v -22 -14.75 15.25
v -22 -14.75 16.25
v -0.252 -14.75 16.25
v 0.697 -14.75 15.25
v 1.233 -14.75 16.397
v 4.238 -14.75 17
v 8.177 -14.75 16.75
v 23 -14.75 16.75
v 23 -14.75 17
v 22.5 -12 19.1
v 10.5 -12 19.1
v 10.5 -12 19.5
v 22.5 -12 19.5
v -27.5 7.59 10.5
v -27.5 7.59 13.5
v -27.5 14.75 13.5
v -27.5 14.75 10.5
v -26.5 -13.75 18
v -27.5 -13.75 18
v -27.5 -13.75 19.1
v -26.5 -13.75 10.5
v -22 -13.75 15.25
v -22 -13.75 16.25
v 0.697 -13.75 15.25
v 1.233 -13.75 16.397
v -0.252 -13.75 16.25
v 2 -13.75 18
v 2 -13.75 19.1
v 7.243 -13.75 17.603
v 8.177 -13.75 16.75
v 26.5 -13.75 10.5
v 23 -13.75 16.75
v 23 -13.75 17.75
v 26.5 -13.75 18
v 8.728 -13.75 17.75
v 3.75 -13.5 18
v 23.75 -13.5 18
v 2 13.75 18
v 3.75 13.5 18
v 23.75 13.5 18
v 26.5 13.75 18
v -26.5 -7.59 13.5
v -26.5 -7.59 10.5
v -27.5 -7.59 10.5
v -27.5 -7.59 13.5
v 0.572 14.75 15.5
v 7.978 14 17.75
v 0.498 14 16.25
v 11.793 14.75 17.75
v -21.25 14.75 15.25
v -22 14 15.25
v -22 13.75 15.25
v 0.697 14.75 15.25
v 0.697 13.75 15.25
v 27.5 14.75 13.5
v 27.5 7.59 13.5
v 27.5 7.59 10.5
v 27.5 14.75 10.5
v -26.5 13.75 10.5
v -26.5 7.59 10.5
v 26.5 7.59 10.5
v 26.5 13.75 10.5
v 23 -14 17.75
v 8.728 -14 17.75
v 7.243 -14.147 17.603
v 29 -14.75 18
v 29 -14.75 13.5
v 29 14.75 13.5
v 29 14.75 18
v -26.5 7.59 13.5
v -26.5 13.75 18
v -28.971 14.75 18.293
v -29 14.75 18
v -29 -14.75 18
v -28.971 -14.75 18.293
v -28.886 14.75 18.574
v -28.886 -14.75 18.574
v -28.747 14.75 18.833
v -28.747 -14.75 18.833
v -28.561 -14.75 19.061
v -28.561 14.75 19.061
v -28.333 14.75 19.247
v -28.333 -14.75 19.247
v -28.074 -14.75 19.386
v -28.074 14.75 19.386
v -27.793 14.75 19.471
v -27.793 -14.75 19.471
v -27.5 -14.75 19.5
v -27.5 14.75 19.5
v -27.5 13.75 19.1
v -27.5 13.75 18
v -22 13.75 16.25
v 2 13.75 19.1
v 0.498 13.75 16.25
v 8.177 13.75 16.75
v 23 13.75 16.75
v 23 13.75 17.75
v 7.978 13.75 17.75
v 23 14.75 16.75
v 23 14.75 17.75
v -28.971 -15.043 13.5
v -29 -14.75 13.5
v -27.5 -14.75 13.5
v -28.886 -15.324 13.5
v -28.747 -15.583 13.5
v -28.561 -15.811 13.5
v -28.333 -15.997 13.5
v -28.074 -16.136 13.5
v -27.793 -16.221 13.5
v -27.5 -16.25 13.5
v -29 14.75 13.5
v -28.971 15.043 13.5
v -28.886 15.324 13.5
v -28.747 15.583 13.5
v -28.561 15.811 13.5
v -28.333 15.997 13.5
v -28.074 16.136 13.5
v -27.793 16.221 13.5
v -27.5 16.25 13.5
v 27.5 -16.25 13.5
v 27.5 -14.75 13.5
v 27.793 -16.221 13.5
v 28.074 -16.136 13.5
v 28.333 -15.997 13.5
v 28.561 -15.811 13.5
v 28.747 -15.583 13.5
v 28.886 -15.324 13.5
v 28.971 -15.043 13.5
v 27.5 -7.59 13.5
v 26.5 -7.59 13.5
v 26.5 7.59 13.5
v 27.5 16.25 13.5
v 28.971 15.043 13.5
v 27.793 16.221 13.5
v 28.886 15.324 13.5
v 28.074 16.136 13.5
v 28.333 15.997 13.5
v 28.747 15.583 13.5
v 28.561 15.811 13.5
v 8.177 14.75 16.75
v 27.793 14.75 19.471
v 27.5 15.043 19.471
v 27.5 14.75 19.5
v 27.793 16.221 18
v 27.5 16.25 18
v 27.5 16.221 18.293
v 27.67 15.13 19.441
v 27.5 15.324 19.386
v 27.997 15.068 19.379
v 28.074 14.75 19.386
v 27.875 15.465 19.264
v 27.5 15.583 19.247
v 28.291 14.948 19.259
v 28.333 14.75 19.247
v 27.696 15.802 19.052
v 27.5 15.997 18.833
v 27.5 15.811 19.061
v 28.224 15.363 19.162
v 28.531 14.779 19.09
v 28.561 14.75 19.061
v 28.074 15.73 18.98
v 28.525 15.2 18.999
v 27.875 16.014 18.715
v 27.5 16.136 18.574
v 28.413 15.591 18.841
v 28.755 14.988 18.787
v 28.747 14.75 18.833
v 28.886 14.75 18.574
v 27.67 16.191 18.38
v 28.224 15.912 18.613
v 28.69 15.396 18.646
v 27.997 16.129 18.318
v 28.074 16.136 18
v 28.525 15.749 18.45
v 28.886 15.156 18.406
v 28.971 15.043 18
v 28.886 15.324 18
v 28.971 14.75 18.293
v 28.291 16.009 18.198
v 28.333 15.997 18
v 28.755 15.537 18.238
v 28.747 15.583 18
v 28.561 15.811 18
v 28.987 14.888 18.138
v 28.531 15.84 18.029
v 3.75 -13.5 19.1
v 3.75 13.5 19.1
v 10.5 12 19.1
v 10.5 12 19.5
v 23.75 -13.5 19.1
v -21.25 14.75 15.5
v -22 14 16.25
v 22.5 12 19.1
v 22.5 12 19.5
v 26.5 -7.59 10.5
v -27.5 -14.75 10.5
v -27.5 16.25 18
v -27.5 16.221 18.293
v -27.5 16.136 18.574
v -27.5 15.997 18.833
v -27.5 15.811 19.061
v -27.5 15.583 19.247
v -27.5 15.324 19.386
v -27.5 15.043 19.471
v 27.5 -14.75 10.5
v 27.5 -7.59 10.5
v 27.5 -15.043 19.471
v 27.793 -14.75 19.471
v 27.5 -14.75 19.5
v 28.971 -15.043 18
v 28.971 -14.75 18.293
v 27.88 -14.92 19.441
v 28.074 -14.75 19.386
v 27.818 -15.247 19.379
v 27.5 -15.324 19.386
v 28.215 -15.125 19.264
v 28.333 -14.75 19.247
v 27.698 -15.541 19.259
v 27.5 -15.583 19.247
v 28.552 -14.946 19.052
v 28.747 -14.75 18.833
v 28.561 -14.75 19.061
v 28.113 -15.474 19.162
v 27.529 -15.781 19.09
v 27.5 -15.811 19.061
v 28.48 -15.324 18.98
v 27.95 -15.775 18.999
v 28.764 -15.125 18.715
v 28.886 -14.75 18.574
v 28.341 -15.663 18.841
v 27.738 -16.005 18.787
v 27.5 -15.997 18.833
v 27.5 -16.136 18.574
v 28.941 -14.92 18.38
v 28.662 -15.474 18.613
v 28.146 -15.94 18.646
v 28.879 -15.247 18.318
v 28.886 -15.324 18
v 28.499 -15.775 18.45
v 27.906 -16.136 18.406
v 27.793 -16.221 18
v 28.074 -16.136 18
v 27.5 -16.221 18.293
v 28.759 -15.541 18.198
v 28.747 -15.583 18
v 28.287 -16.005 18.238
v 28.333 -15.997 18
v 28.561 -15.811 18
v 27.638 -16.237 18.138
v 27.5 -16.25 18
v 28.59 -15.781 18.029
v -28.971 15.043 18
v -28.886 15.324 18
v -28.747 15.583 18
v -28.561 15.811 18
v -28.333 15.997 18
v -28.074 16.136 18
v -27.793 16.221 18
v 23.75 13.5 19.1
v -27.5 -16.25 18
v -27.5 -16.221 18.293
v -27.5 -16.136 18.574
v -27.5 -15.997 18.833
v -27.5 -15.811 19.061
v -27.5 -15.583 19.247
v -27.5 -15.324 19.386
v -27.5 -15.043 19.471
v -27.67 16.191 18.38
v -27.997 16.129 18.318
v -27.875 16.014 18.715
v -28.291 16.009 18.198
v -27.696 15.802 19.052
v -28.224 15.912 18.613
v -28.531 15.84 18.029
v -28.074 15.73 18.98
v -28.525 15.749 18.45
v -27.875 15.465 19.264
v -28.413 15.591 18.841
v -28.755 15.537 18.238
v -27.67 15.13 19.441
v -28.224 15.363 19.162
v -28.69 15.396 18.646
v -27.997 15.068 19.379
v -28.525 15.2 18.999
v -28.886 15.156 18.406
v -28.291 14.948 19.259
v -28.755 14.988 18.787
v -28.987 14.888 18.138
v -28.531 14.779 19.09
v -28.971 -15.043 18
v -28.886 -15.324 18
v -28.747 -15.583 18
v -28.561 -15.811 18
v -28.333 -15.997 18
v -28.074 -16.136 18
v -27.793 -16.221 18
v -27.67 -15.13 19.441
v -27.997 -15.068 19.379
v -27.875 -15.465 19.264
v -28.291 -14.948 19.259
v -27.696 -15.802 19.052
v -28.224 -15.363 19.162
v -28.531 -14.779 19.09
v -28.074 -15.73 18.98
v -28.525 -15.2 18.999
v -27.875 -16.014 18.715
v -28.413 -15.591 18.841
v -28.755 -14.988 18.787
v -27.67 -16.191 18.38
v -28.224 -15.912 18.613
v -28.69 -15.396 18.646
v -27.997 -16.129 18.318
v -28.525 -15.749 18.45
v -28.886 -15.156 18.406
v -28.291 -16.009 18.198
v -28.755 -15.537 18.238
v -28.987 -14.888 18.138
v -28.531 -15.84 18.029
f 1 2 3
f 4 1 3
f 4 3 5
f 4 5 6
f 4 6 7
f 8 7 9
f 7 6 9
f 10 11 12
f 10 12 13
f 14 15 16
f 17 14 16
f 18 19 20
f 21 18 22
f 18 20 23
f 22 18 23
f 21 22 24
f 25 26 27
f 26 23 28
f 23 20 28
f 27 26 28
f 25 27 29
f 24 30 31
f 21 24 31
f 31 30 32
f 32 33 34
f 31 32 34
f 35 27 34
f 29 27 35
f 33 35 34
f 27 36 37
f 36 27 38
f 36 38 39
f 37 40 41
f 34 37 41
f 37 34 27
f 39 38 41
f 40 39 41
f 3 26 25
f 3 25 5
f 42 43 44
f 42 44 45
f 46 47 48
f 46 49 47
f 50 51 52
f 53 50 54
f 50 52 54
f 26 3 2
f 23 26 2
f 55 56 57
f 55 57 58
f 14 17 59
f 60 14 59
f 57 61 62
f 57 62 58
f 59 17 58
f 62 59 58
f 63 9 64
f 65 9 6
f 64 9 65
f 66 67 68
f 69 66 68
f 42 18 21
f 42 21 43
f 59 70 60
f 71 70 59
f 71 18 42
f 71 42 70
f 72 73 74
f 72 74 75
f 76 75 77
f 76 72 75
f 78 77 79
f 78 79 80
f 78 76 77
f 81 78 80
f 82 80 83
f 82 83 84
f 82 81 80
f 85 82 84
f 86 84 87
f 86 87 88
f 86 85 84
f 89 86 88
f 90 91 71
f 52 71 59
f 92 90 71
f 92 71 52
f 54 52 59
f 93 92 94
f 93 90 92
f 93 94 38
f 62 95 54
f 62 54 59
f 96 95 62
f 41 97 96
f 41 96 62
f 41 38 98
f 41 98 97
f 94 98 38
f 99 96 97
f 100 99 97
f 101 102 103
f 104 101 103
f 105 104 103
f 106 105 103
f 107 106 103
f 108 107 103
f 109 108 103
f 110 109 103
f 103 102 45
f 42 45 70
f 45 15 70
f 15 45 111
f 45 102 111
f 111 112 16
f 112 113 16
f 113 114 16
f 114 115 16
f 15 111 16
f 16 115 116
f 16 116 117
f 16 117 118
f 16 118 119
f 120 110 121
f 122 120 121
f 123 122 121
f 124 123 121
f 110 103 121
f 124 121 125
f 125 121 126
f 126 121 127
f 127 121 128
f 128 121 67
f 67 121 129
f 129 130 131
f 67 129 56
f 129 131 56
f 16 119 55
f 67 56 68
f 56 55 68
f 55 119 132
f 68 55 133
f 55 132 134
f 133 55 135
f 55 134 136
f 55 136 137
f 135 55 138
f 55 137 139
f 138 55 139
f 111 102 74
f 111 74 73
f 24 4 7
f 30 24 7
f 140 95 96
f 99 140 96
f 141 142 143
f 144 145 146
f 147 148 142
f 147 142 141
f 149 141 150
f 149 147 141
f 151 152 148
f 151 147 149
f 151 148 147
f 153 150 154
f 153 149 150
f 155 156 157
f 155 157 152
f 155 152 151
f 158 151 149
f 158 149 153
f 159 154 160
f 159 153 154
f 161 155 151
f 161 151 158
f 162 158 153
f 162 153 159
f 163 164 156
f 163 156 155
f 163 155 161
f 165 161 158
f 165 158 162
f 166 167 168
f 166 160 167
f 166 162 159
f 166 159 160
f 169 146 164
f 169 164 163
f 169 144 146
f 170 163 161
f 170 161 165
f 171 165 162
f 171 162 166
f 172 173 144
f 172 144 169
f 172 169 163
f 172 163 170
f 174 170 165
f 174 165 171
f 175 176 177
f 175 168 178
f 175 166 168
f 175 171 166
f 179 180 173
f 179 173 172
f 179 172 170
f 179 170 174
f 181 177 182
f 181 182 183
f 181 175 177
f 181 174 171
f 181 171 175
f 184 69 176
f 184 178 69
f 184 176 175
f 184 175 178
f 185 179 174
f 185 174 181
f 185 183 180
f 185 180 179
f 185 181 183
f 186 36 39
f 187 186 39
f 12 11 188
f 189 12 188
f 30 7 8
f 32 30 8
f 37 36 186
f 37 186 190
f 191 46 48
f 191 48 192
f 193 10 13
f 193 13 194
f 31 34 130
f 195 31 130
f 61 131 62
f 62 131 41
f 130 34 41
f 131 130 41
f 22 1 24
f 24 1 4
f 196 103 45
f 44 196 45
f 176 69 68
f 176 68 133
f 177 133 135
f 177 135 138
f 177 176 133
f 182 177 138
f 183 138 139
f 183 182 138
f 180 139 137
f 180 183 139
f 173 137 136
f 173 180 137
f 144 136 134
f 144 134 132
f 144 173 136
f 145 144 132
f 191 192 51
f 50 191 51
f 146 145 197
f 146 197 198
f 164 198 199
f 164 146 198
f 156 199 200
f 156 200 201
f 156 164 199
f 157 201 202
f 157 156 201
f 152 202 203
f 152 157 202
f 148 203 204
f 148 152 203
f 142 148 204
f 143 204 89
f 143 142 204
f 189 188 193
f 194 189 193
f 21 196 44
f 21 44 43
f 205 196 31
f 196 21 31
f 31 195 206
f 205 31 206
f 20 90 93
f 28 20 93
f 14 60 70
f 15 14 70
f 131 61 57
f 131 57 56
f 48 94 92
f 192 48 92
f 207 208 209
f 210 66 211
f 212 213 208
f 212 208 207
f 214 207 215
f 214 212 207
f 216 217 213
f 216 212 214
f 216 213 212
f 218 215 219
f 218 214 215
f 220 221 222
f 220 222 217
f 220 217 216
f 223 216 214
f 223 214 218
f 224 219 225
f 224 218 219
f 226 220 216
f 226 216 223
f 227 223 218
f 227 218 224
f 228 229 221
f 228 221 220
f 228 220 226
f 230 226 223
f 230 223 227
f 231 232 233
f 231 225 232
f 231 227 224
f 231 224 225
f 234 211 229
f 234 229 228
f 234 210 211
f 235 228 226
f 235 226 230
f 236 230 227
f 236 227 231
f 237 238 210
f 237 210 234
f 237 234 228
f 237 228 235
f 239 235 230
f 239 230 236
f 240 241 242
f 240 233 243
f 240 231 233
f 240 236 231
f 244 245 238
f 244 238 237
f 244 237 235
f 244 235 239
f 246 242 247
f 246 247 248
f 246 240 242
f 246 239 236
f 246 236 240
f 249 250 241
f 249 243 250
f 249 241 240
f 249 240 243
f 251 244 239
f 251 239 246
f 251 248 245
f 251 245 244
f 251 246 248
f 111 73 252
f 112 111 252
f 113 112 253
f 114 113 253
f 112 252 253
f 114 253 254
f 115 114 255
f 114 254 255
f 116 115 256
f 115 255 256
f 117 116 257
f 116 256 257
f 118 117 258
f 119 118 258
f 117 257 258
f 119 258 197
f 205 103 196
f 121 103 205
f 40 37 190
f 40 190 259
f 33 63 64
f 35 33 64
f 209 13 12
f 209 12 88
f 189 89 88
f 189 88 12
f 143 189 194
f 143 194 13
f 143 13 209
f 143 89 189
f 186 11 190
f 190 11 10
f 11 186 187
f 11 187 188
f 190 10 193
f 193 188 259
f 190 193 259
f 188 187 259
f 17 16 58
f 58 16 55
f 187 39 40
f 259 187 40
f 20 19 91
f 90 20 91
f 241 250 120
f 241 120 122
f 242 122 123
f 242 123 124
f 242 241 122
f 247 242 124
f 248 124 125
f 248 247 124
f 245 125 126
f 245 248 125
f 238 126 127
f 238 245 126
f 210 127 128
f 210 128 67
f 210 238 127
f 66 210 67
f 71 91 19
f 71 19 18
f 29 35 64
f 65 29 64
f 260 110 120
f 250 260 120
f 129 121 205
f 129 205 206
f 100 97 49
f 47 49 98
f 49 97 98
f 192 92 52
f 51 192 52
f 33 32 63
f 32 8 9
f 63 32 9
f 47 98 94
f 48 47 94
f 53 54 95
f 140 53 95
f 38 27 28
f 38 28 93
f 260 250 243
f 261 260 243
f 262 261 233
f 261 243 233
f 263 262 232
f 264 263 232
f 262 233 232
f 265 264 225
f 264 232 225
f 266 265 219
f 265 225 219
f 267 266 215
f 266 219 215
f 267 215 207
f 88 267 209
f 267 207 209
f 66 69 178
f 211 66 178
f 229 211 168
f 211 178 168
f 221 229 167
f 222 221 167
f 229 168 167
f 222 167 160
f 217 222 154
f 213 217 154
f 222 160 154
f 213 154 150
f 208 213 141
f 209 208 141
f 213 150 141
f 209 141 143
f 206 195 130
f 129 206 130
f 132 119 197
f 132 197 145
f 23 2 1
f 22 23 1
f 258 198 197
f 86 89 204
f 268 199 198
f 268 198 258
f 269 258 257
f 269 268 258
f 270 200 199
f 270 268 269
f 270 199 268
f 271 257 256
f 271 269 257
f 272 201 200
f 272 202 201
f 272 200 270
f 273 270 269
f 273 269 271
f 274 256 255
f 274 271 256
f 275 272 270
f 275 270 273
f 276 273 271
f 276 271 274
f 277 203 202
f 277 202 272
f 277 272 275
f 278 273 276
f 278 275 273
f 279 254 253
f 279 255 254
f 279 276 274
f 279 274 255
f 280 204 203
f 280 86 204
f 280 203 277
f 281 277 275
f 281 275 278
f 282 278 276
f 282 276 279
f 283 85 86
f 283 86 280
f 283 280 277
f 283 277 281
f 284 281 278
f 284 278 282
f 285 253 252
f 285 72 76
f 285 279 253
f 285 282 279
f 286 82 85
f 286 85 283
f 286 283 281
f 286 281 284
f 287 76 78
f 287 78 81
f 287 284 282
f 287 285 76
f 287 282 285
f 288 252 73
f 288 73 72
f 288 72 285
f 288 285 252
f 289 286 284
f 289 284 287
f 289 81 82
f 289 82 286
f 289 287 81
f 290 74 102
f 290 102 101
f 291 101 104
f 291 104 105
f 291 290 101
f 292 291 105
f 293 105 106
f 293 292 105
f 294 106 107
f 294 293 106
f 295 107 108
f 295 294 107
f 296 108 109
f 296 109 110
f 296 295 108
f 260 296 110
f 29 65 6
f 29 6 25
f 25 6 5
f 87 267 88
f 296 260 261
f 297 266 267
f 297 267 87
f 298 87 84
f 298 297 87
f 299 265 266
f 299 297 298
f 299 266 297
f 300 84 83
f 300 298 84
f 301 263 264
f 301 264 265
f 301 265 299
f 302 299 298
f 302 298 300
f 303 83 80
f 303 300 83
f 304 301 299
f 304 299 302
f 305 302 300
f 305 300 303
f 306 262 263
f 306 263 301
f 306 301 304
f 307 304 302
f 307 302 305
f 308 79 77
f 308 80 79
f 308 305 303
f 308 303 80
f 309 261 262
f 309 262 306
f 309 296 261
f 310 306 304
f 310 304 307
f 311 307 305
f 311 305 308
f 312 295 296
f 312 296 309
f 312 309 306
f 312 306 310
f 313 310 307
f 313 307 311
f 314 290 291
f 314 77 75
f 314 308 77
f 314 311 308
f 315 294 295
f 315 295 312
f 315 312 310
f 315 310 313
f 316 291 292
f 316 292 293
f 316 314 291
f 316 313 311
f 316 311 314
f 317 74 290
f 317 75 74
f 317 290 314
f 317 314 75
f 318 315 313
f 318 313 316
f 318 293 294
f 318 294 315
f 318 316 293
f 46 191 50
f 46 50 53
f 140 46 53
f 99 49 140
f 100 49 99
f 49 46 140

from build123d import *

# Parameters (mm, degrees)
SKETCH038_W          = 55
SKETCH038_H          = 29.5
PAD009_DEPTH         = 4.5
THICKNESS003_T       = 1.5
SKETCH039_W          = 55
SKETCH039_H          = 29.5
SKETCH039_W_2        = 53
SKETCH039_H_2        = 27.5
PAD010_DEPTH         = 4.5
PAD010_DEPTH_BACK    = 3
SKETCH040_W          = 15.180022
SKETCH040_H          = 15.677626
POCKET024_DEPTH      = 29.001
POCKET024_DEPTH_BACK = 29.001
SKETCH043_W          = 20
SKETCH043_H          = 27
SKETCH043_W_2        = 29.5
SKETCH043_H_2        = 27.5
POCKET026_DEPTH      = 1.1
SKETCH042_W          = 12
SKETCH042_H          = 24
POCKET029_DEPTH      = 6.001
POCKET030_DEPTH      = 14.75
CHAMFER006_SIZE      = 0.75


with BuildPart() as part:
    # Sketch038 → Pad009 (new body)
    with BuildSketch(Plane.XY):
        Rectangle(SKETCH038_W, SKETCH038_H)
    extrude(amount=PAD009_DEPTH)

    # Thickness003
    thickness003_openings = [part.faces().sort_by_distance(p)[0] for p in [
        (0, 0, 0),
    ]]
    offset(amount=THICKNESS003_T, openings=thickness003_openings)

    # Sketch039 → Pad010 (join, two sides)
    with BuildSketch(Plane.XY) as pad010_sk:
        Rectangle(SKETCH039_W, SKETCH039_H)
        Rectangle(SKETCH039_W_2, SKETCH039_H_2, mode=Mode.SUBTRACT)
    extrude(amount=PAD010_DEPTH)
    extrude(pad010_sk.sketch, amount=-PAD010_DEPTH_BACK)

    # Sketch040 → Pocket024 (cut, two sides)
    with BuildSketch(Plane.YZ) as pocket024_sk:
        with Locations((0, -7.838813)):
            Rectangle(SKETCH040_W, SKETCH040_H)
    extrude(amount=POCKET024_DEPTH, mode=Mode.SUBTRACT)
    extrude(pocket024_sk.sketch, amount=-POCKET024_DEPTH_BACK, mode=Mode.SUBTRACT)

    # Sketch043 → Pocket026 (cut)
    with BuildSketch(Plane.XY.offset(4.5)):
        with Locations((13.75, 0)):
            Rectangle(SKETCH043_W, SKETCH043_H)
        with Locations((-12.75, 0)):
            Rectangle(SKETCH043_W_2, SKETCH043_H_2)
    extrude(amount=POCKET026_DEPTH, mode=Mode.SUBTRACT)

    # Sketch042 → Pocket029 (cut, through all)
    with BuildSketch(Plane.XY):
        with Locations((16.5, 0)):
            Rectangle(SKETCH042_W, SKETCH042_H)
    extrude(amount=POCKET029_DEPTH, mode=Mode.SUBTRACT)

    # Sketch051 → Pocket030 (cut, symmetric)
    with BuildSketch(Plane.XZ):
        Polygon((23, 3.25), (23, 4.25), (7.978224, 4.25), (0.497934, 2.75), (-22, 2.75), (-22, 1.75), (0.696514, 1.75), (8.176805, 3.25), align=None)
    extrude(amount=POCKET030_DEPTH, both=True, mode=Mode.SUBTRACT)

    # Chamfer006
    chamfer006_edges = [part.edges().sort_by_distance(p)[0] for p in [
        (0.497934, -14.25, 2.75),
        (-22, 14.75, 2.25),
        (-10.751033, 14.75, 2.75),
        (4.238079, 14.75, 3.5),
        (7.978224, -14.25, 4.25),
        (15.489112, -14.75, 4.25),
    ]]
    chamfer(chamfer006_edges, length=CHAMFER006_SIZE)


with BuildPart() as part_1:
    # Body004 placement: moved
    add(part.part.moved(Location((0, 0, 13.5))))


solid = part_1.part
